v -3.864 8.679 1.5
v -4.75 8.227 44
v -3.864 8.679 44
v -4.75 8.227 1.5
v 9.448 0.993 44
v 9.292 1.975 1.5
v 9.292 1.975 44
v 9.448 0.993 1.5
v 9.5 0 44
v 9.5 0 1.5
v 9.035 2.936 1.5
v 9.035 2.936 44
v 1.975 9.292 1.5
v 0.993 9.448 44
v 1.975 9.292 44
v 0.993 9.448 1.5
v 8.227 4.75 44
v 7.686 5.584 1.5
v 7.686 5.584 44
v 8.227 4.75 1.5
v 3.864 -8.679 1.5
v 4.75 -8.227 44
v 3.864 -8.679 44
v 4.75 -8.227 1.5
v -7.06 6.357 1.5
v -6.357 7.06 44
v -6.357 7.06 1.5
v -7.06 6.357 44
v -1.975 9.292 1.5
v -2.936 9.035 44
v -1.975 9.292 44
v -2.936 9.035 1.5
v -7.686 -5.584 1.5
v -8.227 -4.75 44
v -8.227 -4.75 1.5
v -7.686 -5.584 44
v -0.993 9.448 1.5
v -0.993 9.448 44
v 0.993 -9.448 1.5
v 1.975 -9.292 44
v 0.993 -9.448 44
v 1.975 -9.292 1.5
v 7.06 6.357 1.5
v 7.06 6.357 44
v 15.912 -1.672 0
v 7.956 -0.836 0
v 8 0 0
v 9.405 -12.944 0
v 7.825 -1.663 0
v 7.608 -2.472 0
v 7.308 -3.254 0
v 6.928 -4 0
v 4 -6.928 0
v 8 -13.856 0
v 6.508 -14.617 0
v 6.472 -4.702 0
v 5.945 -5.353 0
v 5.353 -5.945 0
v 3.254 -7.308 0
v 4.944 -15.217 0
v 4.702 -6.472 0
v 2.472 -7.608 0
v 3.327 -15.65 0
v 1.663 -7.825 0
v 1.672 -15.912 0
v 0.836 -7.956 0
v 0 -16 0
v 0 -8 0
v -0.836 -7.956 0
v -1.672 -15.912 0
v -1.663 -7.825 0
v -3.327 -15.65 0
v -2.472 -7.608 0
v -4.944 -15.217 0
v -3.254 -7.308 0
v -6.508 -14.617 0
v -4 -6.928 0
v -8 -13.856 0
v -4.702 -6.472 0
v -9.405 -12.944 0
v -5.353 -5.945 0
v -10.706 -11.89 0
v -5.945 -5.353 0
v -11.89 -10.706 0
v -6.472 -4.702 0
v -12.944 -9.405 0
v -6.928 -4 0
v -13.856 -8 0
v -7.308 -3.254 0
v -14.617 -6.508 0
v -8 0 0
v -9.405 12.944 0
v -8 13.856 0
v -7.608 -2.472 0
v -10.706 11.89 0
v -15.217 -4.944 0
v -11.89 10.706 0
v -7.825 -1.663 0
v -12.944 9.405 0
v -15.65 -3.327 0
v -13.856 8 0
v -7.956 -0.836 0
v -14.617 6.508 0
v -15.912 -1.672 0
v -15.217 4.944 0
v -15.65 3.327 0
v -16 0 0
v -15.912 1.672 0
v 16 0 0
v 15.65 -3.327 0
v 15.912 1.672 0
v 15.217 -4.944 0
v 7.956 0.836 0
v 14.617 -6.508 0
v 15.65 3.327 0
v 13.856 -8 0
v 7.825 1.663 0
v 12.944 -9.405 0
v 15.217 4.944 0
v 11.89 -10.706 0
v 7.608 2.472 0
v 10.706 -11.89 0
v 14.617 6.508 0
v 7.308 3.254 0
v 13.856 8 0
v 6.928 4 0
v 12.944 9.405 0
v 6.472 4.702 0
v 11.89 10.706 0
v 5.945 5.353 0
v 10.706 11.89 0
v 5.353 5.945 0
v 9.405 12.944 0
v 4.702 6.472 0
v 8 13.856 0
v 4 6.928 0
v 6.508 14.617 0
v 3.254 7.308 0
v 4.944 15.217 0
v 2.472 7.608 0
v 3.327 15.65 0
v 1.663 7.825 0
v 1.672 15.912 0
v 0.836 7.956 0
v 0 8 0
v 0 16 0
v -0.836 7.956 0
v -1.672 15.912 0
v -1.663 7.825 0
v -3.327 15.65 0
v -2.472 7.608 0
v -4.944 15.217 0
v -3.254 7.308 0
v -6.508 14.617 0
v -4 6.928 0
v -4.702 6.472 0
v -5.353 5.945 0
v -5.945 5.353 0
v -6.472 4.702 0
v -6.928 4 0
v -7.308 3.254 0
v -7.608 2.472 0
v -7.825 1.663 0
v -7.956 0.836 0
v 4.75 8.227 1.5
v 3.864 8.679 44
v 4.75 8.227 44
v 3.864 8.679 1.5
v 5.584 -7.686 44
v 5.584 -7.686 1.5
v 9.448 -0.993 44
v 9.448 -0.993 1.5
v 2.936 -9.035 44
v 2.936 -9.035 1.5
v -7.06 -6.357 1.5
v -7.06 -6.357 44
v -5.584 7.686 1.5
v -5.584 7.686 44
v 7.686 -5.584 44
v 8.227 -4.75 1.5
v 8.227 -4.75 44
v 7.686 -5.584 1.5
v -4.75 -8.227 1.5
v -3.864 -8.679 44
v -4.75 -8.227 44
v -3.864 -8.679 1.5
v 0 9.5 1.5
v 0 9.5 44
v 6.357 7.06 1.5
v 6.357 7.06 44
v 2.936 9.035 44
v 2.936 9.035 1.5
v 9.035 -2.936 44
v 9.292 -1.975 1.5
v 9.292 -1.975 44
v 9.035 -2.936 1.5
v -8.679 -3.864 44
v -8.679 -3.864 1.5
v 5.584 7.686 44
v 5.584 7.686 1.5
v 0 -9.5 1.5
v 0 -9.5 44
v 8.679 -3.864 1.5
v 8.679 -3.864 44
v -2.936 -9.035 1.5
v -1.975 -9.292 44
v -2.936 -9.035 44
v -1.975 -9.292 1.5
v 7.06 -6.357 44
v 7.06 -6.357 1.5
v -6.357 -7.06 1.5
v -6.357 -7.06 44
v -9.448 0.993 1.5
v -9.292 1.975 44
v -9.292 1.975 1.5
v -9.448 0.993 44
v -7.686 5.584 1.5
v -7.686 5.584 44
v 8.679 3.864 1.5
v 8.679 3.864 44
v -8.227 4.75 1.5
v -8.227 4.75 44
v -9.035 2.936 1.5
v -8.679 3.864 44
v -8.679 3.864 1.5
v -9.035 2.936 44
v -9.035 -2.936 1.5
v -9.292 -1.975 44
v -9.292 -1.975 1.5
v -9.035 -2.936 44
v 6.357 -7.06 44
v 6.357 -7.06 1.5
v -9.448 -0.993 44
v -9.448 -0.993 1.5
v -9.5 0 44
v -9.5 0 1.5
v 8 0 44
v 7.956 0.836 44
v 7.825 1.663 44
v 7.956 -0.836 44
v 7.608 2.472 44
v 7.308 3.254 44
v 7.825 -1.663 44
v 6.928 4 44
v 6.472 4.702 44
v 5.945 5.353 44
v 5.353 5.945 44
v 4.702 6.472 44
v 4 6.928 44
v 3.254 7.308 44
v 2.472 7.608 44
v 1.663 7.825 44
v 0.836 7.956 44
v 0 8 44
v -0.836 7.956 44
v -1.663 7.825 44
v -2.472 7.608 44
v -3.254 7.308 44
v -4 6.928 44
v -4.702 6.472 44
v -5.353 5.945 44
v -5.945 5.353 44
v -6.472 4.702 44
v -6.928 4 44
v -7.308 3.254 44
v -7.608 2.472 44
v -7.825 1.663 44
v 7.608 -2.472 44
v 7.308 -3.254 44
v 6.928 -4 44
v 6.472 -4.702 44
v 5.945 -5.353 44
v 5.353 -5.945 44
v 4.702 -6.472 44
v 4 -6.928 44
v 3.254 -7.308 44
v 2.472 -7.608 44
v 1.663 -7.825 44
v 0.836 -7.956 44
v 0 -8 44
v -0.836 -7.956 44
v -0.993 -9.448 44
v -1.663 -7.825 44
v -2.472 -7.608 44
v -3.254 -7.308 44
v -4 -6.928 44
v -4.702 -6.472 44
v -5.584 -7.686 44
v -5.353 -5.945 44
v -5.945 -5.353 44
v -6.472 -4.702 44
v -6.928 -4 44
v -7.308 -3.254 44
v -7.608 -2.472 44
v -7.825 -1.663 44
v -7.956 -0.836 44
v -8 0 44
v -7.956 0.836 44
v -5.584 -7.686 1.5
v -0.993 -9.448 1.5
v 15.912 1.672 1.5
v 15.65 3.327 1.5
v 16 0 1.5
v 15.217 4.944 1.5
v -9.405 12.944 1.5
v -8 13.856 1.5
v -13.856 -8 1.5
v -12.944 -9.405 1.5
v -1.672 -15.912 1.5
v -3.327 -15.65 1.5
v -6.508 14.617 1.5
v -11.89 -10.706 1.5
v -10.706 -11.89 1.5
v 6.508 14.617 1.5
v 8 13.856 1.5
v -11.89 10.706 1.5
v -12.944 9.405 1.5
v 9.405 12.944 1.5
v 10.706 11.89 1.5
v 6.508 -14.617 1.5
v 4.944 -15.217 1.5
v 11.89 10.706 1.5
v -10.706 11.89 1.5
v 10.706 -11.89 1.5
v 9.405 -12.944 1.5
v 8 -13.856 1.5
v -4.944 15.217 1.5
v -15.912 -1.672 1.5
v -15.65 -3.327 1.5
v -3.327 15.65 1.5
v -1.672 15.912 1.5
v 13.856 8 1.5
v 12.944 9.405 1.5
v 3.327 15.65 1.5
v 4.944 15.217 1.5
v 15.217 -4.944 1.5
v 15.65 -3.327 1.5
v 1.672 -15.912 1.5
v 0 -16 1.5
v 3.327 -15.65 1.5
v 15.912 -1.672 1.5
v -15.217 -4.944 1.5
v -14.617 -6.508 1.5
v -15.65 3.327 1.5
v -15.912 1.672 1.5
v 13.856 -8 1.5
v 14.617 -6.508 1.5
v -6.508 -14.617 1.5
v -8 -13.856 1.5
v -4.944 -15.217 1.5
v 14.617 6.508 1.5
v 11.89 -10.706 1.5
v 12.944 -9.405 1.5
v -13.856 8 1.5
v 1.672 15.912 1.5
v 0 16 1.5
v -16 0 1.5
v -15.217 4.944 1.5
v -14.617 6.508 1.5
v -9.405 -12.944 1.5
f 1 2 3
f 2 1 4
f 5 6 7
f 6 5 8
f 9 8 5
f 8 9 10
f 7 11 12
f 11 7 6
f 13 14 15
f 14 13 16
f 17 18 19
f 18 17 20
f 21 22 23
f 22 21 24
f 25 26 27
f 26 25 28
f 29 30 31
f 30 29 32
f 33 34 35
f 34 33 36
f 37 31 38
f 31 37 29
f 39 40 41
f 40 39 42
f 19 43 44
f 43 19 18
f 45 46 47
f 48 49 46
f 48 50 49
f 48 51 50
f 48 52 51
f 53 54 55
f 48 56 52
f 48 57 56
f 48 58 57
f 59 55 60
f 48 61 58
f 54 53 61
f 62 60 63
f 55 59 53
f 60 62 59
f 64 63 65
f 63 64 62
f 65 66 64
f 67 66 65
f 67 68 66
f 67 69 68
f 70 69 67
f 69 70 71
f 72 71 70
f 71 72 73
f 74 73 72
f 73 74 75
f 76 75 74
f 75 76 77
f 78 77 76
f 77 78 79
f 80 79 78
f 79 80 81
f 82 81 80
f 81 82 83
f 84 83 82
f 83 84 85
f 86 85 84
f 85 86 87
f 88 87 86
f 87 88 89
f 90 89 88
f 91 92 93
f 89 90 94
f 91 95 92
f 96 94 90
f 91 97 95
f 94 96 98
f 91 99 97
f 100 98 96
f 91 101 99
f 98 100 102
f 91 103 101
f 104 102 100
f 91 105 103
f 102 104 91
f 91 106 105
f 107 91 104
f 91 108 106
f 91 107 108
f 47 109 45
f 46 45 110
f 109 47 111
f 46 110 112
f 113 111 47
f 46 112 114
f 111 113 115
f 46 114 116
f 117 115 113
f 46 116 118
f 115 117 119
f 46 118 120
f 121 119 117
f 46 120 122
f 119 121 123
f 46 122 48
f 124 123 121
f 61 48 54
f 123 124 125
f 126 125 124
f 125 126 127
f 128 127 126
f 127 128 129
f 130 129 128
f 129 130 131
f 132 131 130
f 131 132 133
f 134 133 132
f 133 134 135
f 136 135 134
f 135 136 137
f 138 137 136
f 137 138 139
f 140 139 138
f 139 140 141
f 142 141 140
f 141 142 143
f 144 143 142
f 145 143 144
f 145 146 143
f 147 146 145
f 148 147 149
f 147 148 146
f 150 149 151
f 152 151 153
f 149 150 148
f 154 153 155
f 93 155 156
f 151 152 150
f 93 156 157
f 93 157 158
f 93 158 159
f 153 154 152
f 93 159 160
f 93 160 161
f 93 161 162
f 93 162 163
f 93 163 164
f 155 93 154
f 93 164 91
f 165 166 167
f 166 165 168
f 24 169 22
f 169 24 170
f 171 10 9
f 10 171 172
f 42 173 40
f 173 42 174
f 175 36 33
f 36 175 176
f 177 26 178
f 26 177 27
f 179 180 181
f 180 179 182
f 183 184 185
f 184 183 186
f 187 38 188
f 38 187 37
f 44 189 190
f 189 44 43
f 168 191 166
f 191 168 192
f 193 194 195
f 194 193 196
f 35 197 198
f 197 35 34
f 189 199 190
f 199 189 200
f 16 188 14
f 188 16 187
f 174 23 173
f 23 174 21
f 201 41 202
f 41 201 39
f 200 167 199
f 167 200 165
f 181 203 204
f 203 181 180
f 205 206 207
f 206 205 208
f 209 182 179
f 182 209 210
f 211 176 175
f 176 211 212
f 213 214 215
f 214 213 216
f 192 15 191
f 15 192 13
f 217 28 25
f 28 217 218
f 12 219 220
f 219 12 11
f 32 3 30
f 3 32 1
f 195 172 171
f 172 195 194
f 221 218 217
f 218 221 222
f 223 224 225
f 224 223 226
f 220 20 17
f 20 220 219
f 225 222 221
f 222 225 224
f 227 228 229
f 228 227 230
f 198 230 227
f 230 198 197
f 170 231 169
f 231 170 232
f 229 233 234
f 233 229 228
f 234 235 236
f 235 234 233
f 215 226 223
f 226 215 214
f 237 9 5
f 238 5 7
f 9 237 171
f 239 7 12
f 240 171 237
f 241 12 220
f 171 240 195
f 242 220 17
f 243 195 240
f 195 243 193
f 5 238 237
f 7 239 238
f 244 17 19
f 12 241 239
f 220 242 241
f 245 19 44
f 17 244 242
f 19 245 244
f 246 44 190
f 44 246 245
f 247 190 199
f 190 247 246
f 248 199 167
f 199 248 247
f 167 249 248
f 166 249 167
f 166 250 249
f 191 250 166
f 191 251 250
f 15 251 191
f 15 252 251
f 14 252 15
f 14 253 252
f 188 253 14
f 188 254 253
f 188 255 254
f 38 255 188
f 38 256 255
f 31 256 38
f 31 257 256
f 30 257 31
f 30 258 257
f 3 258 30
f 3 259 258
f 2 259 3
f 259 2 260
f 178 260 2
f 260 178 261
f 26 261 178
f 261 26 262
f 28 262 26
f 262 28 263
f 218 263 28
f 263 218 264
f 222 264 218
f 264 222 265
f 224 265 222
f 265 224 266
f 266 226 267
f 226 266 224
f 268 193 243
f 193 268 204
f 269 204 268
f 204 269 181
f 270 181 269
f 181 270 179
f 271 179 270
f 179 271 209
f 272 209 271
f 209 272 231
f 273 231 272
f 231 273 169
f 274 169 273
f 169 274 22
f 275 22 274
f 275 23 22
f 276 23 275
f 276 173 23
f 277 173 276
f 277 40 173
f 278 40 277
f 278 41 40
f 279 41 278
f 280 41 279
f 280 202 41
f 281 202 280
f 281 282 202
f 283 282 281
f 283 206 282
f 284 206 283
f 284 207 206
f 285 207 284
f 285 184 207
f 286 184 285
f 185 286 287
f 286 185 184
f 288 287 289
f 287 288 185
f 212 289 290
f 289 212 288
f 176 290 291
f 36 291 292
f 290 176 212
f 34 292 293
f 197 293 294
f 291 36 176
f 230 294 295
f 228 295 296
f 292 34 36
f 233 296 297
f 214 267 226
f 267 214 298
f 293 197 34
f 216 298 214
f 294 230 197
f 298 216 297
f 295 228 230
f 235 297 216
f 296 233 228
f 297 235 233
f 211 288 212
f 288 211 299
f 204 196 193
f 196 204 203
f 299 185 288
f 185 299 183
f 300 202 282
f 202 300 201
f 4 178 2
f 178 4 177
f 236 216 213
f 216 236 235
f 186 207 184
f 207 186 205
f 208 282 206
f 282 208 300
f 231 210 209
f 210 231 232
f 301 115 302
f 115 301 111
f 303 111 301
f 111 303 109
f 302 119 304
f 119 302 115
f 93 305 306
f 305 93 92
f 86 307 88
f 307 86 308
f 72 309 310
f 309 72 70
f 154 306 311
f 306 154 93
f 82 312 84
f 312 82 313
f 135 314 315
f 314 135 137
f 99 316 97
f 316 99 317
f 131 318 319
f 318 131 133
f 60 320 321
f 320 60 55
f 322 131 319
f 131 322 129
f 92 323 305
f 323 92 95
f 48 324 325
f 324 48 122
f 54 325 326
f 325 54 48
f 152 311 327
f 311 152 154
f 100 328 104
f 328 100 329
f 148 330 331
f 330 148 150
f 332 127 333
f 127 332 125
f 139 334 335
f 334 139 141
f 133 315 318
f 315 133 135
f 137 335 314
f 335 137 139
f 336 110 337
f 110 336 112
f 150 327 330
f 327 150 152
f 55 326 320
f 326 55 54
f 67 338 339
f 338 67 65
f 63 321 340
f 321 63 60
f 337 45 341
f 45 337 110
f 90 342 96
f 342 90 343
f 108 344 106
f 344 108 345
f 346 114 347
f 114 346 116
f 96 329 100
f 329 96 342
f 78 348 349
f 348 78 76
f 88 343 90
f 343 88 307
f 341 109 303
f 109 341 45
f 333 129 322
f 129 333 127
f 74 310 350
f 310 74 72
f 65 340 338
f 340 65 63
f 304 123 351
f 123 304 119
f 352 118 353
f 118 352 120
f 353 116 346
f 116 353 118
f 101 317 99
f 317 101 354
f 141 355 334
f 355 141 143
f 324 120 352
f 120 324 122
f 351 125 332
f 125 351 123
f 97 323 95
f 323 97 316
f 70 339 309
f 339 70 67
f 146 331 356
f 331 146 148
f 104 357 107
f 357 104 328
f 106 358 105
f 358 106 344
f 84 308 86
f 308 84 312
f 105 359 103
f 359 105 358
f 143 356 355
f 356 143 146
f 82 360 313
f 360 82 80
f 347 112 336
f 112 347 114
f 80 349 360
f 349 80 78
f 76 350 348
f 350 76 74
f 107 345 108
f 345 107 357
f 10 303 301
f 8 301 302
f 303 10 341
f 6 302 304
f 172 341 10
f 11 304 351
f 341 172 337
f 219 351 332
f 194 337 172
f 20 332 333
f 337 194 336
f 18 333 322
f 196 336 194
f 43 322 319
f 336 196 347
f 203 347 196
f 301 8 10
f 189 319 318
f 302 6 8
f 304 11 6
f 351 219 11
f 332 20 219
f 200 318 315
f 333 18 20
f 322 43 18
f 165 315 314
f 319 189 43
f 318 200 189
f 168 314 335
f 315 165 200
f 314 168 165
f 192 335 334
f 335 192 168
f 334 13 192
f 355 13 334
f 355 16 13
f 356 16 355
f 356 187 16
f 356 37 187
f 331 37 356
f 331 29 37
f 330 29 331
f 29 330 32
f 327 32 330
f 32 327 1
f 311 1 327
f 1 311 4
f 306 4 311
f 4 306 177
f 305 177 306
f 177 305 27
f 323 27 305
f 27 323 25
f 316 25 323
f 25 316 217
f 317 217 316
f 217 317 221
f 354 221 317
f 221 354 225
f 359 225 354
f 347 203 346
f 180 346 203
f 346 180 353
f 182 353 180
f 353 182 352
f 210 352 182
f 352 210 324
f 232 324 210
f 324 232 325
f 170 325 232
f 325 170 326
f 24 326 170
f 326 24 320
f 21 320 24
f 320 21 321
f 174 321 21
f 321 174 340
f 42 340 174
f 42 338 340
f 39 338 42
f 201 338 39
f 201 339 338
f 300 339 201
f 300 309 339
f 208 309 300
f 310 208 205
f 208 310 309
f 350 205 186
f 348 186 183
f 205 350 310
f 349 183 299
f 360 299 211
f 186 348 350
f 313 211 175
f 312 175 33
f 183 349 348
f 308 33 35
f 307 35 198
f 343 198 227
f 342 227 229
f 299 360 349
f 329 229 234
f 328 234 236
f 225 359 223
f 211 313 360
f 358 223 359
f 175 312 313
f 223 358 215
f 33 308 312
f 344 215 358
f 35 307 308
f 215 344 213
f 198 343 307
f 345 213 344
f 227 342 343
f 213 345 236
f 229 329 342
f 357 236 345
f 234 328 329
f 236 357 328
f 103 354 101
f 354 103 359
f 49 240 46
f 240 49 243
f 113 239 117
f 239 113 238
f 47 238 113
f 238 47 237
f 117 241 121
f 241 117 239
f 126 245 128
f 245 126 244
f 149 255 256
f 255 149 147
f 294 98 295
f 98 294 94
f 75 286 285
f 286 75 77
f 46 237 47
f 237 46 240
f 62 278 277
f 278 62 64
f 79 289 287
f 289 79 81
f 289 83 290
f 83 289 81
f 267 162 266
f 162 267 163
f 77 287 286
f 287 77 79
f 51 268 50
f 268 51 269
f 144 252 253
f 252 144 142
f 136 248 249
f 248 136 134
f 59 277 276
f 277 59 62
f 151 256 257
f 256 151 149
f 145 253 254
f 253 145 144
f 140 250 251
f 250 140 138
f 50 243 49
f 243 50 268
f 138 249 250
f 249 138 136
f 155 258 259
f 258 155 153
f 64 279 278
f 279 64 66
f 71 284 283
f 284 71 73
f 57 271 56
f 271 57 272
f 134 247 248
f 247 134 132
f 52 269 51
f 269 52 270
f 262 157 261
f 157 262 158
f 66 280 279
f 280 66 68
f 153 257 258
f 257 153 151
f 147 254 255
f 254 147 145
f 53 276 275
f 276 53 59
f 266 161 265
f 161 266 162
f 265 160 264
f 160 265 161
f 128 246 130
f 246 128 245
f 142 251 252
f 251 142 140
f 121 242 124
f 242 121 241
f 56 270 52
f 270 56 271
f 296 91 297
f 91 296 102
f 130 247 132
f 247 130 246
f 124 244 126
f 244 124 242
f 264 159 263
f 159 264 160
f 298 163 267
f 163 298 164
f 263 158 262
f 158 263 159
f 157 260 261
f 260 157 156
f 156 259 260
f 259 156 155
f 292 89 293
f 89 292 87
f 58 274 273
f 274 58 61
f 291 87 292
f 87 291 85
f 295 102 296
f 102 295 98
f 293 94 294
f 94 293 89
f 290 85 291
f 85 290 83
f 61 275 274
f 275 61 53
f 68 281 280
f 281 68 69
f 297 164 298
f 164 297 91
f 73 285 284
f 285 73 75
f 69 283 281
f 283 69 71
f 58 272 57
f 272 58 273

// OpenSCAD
// Blind-rivet body.
$fn = 60;
eps = 0.02;
shank_d = 16;
head_d = 32;
length = 44;
difference() { union() { cylinder(d=shank_d+3,h=length); cylinder(d=max(head_d, shank_d+5),h=1.5); } translate([0,0,-eps]) cylinder(d=shank_d,h=length+2*eps); }
